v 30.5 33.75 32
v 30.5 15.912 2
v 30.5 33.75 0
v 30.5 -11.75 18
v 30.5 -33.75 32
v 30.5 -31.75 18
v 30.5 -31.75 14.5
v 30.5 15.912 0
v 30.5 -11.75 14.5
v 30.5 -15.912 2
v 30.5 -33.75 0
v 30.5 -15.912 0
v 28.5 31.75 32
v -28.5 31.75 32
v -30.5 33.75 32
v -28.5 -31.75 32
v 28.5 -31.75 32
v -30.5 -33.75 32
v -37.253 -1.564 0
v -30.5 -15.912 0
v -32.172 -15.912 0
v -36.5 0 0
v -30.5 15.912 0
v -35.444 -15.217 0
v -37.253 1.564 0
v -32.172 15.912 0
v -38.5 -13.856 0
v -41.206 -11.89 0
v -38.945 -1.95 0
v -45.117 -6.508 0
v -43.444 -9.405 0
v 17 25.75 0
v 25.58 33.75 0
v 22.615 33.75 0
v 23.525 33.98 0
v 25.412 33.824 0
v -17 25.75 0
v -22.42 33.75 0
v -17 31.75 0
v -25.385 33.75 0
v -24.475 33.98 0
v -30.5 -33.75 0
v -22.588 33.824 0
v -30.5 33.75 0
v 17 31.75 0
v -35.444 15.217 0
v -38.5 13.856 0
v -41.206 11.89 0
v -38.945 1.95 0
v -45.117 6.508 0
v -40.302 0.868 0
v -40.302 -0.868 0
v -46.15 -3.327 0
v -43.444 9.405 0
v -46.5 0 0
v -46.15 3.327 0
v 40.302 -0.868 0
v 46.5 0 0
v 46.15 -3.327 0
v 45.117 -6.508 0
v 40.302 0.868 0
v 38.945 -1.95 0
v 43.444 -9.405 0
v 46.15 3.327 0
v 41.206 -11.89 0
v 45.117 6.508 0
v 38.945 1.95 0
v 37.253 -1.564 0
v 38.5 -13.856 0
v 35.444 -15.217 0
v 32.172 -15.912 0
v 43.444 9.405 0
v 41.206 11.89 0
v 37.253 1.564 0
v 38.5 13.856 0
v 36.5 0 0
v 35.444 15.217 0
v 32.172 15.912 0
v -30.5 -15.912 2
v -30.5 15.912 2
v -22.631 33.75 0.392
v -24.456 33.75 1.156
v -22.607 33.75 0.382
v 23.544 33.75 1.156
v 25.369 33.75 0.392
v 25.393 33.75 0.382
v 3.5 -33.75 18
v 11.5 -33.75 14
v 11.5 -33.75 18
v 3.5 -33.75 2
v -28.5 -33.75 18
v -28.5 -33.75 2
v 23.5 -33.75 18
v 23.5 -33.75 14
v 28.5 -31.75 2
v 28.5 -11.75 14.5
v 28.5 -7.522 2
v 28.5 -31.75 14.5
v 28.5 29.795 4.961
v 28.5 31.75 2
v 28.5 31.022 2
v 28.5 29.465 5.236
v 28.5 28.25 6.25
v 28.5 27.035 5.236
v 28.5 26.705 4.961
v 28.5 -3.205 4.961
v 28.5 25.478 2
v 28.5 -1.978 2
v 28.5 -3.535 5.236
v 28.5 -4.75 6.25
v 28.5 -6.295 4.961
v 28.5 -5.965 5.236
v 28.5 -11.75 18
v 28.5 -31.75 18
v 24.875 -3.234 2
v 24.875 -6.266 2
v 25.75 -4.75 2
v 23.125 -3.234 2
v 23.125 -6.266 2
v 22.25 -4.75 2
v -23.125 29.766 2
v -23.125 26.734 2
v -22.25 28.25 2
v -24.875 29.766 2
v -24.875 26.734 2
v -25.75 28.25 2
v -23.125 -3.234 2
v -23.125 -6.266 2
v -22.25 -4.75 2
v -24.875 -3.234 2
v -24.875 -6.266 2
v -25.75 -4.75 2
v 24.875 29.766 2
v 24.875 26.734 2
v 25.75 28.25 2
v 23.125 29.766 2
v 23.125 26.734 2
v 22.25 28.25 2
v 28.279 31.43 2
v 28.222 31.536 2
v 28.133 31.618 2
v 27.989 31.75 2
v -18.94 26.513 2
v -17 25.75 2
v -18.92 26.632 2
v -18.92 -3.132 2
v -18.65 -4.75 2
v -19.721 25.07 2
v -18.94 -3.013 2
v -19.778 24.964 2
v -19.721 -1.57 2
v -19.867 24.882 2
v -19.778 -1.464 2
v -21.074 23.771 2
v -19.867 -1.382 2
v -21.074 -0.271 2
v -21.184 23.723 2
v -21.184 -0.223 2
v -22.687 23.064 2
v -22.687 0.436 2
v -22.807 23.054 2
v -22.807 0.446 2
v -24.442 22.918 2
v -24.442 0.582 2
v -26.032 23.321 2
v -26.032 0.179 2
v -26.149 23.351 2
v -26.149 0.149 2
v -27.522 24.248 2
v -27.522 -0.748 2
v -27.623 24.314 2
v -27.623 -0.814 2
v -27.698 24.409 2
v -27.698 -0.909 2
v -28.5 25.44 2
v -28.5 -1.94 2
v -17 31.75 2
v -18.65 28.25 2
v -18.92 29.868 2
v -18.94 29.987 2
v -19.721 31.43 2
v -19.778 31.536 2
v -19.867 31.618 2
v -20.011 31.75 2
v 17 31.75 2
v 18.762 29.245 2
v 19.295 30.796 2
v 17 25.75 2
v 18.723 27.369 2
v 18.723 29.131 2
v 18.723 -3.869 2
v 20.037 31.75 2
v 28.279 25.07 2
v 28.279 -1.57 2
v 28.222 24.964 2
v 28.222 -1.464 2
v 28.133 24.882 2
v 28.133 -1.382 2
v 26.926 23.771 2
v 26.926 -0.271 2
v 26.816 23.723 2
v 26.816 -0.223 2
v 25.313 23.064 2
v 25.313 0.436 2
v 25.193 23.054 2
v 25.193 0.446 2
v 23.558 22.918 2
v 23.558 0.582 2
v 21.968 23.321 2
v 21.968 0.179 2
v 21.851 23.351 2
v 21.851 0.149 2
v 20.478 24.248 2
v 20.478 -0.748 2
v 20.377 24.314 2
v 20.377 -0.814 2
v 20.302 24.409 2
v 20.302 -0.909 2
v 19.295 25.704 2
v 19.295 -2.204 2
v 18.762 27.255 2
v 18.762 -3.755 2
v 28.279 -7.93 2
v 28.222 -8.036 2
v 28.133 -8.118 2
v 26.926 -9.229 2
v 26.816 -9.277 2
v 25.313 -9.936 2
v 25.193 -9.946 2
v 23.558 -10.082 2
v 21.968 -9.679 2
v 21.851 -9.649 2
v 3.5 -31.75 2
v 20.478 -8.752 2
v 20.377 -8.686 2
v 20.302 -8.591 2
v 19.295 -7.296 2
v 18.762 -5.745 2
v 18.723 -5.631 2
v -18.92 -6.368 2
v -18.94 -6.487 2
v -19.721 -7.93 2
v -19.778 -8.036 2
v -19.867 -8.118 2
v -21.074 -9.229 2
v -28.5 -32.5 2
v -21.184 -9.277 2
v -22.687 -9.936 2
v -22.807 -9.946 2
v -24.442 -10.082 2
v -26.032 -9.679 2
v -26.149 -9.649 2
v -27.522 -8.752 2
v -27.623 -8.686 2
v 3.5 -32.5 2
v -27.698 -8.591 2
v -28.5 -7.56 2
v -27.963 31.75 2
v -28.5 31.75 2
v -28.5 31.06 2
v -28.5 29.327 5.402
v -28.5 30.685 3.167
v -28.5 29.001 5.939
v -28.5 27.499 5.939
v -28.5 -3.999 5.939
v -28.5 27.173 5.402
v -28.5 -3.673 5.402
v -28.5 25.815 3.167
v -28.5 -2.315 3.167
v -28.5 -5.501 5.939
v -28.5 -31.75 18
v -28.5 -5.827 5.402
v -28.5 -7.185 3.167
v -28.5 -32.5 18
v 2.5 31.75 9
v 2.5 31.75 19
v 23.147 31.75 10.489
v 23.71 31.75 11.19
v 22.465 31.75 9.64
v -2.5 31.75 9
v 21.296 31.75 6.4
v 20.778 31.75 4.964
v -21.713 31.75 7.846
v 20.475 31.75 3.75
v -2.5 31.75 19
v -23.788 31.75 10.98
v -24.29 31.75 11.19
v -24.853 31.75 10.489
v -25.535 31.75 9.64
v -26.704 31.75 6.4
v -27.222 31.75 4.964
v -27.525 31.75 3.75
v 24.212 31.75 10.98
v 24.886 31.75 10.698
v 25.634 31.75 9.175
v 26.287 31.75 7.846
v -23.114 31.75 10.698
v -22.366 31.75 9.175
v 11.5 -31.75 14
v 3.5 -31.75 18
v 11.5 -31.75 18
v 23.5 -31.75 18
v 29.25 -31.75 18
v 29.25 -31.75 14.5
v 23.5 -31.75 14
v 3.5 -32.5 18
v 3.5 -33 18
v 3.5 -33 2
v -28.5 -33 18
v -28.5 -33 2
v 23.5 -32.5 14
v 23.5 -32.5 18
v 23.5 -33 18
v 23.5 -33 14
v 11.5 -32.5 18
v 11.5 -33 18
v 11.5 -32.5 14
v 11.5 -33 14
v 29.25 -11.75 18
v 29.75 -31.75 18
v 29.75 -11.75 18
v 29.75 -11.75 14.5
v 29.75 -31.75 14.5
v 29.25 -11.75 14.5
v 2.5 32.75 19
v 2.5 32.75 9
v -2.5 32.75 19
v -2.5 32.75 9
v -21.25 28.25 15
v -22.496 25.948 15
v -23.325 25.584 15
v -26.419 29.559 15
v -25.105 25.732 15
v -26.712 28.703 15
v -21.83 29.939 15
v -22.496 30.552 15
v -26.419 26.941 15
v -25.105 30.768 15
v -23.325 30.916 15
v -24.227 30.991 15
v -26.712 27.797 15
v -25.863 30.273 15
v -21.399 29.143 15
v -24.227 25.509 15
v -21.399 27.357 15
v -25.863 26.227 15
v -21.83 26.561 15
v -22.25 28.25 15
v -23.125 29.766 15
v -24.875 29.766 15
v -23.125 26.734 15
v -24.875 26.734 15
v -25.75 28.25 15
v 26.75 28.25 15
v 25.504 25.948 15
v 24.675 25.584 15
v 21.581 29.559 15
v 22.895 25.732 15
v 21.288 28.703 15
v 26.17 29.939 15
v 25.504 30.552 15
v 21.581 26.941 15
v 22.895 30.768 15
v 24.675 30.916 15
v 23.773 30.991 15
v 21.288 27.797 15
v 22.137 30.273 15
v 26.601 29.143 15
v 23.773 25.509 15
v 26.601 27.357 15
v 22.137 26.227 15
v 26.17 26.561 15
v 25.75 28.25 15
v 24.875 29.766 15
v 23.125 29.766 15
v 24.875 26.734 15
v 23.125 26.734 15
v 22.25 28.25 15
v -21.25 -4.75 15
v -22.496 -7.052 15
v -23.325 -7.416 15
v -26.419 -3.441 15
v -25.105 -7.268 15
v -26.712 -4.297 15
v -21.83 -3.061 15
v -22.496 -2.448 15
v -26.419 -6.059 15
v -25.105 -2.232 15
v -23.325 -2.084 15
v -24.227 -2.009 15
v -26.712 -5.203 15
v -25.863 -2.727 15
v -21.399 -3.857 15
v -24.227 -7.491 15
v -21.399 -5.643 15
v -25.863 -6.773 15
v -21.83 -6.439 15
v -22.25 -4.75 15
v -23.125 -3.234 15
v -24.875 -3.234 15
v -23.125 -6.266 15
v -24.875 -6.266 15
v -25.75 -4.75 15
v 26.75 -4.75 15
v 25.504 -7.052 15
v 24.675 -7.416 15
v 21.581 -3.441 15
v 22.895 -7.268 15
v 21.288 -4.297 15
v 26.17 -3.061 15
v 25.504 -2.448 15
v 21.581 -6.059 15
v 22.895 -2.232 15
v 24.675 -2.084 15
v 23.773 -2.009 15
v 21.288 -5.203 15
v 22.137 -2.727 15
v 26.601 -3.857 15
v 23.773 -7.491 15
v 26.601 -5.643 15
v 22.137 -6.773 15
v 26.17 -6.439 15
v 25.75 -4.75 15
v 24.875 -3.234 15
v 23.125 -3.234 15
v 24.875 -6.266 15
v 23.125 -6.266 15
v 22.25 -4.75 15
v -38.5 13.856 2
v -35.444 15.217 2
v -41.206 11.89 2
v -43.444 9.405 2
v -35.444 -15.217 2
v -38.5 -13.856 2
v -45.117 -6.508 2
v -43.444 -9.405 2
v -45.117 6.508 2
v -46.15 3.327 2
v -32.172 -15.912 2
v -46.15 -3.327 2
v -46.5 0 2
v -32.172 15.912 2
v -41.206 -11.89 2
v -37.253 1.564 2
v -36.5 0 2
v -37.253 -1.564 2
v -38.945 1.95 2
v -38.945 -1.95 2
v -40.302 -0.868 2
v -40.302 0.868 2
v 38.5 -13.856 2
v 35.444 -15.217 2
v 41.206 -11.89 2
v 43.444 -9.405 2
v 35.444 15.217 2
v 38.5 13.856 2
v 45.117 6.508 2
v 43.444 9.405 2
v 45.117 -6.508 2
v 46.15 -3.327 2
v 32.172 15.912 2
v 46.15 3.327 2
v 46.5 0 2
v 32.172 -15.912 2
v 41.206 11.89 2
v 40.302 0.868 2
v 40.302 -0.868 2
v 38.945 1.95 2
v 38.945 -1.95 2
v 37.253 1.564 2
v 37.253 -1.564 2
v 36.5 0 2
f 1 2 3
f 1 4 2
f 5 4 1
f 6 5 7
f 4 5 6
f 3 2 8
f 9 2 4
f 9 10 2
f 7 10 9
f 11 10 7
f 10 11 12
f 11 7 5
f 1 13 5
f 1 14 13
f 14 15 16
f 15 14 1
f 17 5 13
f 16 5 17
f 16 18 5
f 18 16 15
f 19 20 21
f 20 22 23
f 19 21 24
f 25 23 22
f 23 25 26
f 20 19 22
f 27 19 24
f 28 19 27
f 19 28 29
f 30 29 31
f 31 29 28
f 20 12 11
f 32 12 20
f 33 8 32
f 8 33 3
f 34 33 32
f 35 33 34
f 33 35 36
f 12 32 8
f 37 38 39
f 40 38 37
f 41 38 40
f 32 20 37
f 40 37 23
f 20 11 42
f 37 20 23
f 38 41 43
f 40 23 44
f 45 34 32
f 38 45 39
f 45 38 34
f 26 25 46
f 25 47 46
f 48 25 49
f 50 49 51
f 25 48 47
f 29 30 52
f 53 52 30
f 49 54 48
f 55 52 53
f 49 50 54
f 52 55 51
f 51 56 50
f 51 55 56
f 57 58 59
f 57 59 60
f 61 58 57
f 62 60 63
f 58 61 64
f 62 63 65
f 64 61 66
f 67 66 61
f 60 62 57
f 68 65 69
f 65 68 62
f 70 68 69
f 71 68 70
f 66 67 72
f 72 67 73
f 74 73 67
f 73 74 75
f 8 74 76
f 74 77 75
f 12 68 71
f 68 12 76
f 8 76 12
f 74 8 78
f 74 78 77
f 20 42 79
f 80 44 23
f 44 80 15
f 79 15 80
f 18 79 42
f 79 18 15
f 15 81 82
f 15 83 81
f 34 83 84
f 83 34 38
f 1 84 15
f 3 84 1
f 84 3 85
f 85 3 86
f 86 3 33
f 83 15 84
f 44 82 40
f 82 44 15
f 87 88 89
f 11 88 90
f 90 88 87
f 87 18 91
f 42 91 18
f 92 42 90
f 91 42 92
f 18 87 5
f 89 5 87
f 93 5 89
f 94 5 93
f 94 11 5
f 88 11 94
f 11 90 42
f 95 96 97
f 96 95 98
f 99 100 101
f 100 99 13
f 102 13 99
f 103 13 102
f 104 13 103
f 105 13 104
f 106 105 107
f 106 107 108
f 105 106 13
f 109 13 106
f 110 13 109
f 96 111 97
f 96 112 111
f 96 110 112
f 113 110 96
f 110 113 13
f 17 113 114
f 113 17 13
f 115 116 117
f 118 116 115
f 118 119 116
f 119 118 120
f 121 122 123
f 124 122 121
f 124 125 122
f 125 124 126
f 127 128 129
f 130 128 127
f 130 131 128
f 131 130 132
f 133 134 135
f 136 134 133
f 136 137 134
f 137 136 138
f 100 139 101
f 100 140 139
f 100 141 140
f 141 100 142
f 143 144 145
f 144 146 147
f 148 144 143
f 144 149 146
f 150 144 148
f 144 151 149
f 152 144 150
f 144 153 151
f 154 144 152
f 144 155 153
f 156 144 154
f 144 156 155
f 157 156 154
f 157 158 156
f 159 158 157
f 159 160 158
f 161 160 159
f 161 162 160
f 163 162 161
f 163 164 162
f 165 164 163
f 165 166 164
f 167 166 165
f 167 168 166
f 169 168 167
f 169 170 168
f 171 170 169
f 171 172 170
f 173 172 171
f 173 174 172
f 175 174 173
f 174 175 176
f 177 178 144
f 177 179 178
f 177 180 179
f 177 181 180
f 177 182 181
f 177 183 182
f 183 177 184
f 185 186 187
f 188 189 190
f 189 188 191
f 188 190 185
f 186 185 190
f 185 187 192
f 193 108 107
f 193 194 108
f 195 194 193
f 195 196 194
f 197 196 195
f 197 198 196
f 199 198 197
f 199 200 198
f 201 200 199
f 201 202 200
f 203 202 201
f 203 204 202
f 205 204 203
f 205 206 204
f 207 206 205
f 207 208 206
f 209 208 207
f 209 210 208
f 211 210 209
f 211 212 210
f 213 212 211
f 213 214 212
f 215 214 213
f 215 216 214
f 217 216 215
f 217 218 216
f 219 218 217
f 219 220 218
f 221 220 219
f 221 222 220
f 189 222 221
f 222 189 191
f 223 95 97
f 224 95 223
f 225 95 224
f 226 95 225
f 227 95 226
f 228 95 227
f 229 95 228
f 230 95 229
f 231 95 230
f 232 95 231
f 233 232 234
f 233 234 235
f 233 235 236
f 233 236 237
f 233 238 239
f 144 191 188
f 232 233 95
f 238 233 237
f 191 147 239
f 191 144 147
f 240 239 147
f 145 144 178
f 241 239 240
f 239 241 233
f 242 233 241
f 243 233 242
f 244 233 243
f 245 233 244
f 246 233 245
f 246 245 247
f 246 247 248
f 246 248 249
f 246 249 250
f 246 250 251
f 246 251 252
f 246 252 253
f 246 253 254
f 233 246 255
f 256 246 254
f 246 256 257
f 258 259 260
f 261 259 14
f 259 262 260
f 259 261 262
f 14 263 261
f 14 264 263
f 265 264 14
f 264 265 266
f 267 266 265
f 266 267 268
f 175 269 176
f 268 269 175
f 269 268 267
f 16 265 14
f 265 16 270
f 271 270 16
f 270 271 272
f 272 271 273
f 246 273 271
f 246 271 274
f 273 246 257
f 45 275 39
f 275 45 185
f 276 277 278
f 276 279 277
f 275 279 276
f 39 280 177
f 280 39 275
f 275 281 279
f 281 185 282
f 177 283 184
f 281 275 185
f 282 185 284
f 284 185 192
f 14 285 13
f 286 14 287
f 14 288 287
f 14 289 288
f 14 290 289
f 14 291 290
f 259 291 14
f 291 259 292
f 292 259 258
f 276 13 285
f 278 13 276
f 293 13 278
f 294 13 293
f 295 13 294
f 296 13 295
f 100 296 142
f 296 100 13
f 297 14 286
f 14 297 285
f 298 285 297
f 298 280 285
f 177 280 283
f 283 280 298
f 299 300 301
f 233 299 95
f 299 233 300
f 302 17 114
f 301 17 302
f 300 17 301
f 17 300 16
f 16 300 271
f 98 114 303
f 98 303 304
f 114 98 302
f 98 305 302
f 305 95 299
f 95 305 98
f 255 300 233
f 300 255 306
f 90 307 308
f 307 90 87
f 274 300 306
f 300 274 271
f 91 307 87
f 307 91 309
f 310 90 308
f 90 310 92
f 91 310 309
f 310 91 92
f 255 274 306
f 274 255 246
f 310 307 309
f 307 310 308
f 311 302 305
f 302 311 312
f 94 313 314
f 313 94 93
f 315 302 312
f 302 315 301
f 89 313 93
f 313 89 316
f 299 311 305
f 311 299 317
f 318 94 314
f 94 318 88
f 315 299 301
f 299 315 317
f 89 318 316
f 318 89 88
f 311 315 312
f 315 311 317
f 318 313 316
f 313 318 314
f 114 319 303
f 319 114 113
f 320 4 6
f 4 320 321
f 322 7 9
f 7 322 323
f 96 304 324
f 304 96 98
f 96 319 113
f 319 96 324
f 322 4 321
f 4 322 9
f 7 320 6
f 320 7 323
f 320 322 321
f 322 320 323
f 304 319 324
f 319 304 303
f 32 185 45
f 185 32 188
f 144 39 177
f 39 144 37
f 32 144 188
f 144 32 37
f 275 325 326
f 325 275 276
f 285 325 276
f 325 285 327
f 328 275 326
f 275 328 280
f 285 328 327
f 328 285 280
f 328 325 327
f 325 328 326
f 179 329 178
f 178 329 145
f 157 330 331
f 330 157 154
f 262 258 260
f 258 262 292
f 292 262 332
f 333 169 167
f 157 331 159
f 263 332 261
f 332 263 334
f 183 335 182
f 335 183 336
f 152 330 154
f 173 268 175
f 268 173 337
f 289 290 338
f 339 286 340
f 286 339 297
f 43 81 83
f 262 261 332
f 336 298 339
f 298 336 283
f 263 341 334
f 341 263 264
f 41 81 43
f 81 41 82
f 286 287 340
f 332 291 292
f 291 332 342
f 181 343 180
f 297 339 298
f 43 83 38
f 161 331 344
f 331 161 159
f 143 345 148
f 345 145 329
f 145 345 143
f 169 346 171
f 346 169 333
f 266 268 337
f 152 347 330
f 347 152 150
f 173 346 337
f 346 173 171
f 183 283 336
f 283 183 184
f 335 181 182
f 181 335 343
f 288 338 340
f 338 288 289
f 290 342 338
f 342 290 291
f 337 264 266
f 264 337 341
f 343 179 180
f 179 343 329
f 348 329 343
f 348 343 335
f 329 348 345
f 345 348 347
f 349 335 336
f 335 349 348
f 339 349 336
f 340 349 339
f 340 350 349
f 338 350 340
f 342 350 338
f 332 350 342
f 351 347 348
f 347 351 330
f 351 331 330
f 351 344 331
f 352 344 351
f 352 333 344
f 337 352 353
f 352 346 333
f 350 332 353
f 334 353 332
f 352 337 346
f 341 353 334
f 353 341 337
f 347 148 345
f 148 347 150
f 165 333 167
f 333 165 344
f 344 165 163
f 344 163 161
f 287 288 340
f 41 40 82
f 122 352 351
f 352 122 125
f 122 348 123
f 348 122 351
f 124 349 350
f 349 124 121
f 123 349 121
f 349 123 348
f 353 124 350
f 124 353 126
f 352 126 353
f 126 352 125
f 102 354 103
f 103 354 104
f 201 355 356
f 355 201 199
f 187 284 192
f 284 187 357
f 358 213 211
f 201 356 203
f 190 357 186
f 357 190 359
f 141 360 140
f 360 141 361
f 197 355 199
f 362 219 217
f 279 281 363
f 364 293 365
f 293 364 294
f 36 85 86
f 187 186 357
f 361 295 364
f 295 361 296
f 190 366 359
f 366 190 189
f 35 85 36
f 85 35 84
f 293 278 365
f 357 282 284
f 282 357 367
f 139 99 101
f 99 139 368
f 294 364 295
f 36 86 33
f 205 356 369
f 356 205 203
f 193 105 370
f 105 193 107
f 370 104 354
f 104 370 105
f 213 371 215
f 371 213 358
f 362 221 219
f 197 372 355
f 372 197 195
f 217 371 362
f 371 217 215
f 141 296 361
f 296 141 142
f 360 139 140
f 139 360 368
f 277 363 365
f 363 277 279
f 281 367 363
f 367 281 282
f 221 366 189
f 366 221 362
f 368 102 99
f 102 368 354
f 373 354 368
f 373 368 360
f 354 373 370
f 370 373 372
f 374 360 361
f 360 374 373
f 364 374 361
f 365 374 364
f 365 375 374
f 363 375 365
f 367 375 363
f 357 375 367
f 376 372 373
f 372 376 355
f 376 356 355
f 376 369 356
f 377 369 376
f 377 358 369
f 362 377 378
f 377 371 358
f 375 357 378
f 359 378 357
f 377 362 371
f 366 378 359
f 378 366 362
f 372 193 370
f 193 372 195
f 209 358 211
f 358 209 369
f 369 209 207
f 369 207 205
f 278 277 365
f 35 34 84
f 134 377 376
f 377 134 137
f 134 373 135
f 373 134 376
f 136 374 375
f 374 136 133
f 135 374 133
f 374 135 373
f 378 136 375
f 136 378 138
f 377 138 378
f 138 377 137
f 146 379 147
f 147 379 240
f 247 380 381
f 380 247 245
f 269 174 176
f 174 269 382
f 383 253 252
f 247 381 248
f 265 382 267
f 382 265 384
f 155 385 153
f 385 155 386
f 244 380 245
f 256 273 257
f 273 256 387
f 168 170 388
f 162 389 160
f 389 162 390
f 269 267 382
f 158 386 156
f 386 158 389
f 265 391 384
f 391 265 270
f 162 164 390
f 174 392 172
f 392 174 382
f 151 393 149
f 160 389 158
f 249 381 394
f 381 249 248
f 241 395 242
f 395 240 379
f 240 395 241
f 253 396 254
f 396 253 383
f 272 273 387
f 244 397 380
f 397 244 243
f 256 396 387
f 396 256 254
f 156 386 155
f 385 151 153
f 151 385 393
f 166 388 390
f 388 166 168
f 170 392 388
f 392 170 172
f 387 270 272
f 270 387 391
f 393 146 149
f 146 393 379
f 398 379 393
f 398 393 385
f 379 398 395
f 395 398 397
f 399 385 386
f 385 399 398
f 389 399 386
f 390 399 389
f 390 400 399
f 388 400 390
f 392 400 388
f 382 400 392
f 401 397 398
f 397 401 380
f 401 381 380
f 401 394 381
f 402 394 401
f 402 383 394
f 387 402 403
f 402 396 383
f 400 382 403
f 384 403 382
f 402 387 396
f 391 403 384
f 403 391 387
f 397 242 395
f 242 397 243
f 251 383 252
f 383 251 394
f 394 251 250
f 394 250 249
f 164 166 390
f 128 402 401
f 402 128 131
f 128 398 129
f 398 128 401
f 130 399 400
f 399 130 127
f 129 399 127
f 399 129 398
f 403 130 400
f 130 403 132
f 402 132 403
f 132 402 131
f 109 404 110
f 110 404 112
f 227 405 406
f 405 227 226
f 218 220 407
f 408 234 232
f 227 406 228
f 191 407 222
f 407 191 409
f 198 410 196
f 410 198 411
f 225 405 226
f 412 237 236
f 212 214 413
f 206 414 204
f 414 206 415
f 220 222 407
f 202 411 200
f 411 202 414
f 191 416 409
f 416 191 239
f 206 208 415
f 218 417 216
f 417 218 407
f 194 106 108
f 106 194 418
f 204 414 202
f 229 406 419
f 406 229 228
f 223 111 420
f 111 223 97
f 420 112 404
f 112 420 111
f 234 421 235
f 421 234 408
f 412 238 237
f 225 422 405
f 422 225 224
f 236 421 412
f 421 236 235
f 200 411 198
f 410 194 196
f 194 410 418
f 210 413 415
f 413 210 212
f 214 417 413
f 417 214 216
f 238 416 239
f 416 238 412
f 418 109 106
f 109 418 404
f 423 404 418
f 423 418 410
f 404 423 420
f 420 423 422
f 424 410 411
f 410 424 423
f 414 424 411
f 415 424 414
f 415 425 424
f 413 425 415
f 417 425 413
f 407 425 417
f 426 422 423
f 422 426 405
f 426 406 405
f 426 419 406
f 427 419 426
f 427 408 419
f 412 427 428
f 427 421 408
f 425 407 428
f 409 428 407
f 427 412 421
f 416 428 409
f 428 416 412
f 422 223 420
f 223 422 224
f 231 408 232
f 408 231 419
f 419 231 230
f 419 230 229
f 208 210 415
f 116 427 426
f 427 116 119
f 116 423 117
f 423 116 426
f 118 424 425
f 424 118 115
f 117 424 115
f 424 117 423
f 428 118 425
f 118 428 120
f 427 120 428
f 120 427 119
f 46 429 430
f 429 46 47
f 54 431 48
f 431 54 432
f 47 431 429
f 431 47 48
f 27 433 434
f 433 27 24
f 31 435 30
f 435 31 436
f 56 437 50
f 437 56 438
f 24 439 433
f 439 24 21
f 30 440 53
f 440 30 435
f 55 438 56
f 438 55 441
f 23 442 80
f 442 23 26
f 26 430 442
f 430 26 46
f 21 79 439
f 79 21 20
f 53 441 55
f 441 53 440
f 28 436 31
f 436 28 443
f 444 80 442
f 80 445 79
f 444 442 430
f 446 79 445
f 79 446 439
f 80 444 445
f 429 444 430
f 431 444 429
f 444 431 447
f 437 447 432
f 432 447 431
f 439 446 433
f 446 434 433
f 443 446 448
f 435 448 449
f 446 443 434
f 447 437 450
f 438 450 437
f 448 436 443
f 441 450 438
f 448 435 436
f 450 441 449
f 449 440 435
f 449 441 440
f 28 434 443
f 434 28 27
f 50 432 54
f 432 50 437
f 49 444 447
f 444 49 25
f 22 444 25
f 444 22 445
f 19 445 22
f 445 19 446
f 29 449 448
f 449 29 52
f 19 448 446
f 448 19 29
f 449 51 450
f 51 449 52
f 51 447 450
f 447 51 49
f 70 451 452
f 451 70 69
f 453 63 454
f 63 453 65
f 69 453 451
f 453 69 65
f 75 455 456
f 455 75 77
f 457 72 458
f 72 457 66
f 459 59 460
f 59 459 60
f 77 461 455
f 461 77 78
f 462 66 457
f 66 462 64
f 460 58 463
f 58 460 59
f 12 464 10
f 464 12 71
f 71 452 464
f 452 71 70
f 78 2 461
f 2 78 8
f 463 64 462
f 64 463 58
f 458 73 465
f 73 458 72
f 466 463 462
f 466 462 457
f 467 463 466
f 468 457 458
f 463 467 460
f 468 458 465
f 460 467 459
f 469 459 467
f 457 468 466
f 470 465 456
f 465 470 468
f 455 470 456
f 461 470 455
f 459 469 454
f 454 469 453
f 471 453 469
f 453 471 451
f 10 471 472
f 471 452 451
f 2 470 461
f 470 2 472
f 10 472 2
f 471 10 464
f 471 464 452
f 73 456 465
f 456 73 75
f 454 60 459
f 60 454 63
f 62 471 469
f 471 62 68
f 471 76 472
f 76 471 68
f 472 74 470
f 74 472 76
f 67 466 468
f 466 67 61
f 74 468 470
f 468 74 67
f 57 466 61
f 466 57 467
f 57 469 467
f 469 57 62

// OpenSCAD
// See https://image.dfrobot.com/image/data/DFR0767/[DFR0767]V1.0_Dimension.jpg
// as referenced in https://www.dfrobot.com/product-2242.html .
// Oriented with RJ45s facing the front and on the bottom side of the case.
// All measurements are in mm.

// Interior dimensions.
case_width = 55.00;
case_height = 30.00; // Does not include the heat sink which sticks out the top.
case_depth = 61.50;

wall_thickness = 2.00; // YMMV.
punch_out_width = 0.50; // Cutouts used for support to be punched out after printing. Set to zero if printed with supports.
pcb_tolerance = 2.00; // Extra space around the edges of the PCB.
pcb_height = 18.00; // Height above the bottom of the case.

bolt_support_hole_diameter = 3.5; // M2.5 slides in okay.
bolt_support_height_offset = 3.00; // Account for bolts and washers on the bottom of the PCB.
bolt_support_wall_thickness = 2.00;
bolt_support_pcb_far_offset = 3.50;
bolt_support_pcb_left_offset = 3.50;
bolt_support_x_distance = 48.00; // x distance between the sets of supports.
bolt_support_y_distance = 33.00; // y distance between the sets of supports.

rj45_cutout_height = 16.00;
rj45_cutout_width = 32.00;

power_cutout_width = 12.00;
power_cutout_height = 4.00;
power_cutout_x_offset = 5.00;

gpio_cutout_width = 34.00;
gpio_cutout_depth = 6.00;

usb_cutout_height = 3.50;
usb_cutout_width = 20.00;

fan_wires_track_width = 5;
fan_wires_track_height = 10;

mount_support_width = 16.00;
mount_support_hole_diameter = 4.00;



interior_width = case_width+pcb_tolerance;
interior_depth = case_depth+pcb_tolerance;
interior_height = case_height;

bolt_support_height = pcb_height - bolt_support_height_offset;
bolt_support_x_center_offset = bolt_support_x_distance/2; // x distance between the center and the bolt_support.
bolt_support_far_y_center_offset = interior_depth/2-bolt_support_pcb_far_offset; // y distance between the center and the far bolt_support.


color("blue", 0.5)
union() {
  // case_bottom w/ cutouts
  difference() {
    case_bottom(interior_width, interior_depth, interior_height, wall_thickness);
    
    // RJ45 cutout
    translate([-interior_width/2, -wall_thickness-interior_depth/2 , pcb_height-rj45_cutout_height])
      difference() {
        cube([rj45_cutout_width, wall_thickness, rj45_cutout_height]);
        translate([0, (wall_thickness-punch_out_width)/2, 0])
          cube([rj45_cutout_width, punch_out_width, rj45_cutout_height]);
      }
    
    // Power cutout
    translate([interior_width/2 - power_cutout_width - power_cutout_x_offset, -(interior_depth/2+wall_thickness-punch_out_width*0), pcb_height-power_cutout_height])
      difference() {
        cube([power_cutout_width, wall_thickness, power_cutout_height]);
        translate([0, (wall_thickness-punch_out_width)/2, 0])
          cube([power_cutout_width, punch_out_width, power_cutout_height]);
      }

    // USB/reset cutout
    translate([interior_width/2, -interior_depth/2, pcb_height-usb_cutout_height])
      difference() {
        cube([wall_thickness, usb_cutout_width, usb_cutout_height]);
        translate([(wall_thickness-punch_out_width)/2, 0, 0])
          cube([punch_out_width, usb_cutout_width, usb_cutout_height]);
      }

    // GPIO cutout
    translate([-gpio_cutout_width/2, interior_depth/2-gpio_cutout_depth, 0])
      cube([gpio_cutout_width, gpio_cutout_depth, wall_thickness]);

    // Fan wires track
    translate([-fan_wires_track_width/2, interior_depth/2, pcb_height/2])
      cube([fan_wires_track_width, wall_thickness/2, fan_wires_track_height]);
  }


  // Far left bolt support.
  translate([-bolt_support_x_center_offset, bolt_support_far_y_center_offset, 0])
    bolt_support(bolt_support_height, bolt_support_hole_diameter, bolt_support_wall_thickness);

  // Far right bolt support.
  translate([bolt_support_x_center_offset, bolt_support_far_y_center_offset, 0])
    bolt_support(bolt_support_height, bolt_support_hole_diameter, bolt_support_wall_thickness);

  // Near left bolt support.
  translate([-bolt_support_x_center_offset, bolt_support_far_y_center_offset-bolt_support_y_distance, 0])
    bolt_support(bolt_support_height, bolt_support_hole_diameter, bolt_support_wall_thickness);

  // Near right bolt support.
  translate([bolt_support_x_center_offset, bolt_support_far_y_center_offset-bolt_support_y_distance, 0])
    bolt_support(bolt_support_height, bolt_support_hole_diameter, bolt_support_wall_thickness);
  
  // Left mount support.
  translate([-(interior_width/2+wall_thickness), 0, 0])
    mount_support(mount_support_width, wall_thickness, mount_support_hole_diameter);

  // Right mount support.
  translate([interior_width/2+wall_thickness, 0, 0])
    rotate([0, 0, 180])
      mount_support(mount_support_width, wall_thickness, mount_support_hole_diameter);
}
  




module case_bottom(width, depth, height, wall_thickness) {
  translate([0, 0, (height+wall_thickness)/2])
  difference() {
    cube([width+wall_thickness*2, depth+wall_thickness*2, height+wall_thickness], center=true);
    translate([0, 0, wall_thickness/2])
      cube([width, depth, height], center=true);
  }
}

module bolt_support(height, diameter, wall_thickness) {
  translate([0, 0, height/2])
  difference() {
    cylinder(h=height, d1=diameter+4*wall_thickness, d2=diameter+wall_thickness, center=true);
    translate([0, 0, wall_thickness/2])
      cylinder(h=height-wall_thickness, d=diameter, center=true);
  }
}

module mount_support(width, thickness, hole_diameter) {
  difference() {
    cylinder(h=thickness, r=width);
    translate([0, -width, 0])
      cube([width, width*2, thickness]);
    translate([-width/2, 0, 0])
      cylinder(h=thickness, d=hole_diameter);
  }
}
